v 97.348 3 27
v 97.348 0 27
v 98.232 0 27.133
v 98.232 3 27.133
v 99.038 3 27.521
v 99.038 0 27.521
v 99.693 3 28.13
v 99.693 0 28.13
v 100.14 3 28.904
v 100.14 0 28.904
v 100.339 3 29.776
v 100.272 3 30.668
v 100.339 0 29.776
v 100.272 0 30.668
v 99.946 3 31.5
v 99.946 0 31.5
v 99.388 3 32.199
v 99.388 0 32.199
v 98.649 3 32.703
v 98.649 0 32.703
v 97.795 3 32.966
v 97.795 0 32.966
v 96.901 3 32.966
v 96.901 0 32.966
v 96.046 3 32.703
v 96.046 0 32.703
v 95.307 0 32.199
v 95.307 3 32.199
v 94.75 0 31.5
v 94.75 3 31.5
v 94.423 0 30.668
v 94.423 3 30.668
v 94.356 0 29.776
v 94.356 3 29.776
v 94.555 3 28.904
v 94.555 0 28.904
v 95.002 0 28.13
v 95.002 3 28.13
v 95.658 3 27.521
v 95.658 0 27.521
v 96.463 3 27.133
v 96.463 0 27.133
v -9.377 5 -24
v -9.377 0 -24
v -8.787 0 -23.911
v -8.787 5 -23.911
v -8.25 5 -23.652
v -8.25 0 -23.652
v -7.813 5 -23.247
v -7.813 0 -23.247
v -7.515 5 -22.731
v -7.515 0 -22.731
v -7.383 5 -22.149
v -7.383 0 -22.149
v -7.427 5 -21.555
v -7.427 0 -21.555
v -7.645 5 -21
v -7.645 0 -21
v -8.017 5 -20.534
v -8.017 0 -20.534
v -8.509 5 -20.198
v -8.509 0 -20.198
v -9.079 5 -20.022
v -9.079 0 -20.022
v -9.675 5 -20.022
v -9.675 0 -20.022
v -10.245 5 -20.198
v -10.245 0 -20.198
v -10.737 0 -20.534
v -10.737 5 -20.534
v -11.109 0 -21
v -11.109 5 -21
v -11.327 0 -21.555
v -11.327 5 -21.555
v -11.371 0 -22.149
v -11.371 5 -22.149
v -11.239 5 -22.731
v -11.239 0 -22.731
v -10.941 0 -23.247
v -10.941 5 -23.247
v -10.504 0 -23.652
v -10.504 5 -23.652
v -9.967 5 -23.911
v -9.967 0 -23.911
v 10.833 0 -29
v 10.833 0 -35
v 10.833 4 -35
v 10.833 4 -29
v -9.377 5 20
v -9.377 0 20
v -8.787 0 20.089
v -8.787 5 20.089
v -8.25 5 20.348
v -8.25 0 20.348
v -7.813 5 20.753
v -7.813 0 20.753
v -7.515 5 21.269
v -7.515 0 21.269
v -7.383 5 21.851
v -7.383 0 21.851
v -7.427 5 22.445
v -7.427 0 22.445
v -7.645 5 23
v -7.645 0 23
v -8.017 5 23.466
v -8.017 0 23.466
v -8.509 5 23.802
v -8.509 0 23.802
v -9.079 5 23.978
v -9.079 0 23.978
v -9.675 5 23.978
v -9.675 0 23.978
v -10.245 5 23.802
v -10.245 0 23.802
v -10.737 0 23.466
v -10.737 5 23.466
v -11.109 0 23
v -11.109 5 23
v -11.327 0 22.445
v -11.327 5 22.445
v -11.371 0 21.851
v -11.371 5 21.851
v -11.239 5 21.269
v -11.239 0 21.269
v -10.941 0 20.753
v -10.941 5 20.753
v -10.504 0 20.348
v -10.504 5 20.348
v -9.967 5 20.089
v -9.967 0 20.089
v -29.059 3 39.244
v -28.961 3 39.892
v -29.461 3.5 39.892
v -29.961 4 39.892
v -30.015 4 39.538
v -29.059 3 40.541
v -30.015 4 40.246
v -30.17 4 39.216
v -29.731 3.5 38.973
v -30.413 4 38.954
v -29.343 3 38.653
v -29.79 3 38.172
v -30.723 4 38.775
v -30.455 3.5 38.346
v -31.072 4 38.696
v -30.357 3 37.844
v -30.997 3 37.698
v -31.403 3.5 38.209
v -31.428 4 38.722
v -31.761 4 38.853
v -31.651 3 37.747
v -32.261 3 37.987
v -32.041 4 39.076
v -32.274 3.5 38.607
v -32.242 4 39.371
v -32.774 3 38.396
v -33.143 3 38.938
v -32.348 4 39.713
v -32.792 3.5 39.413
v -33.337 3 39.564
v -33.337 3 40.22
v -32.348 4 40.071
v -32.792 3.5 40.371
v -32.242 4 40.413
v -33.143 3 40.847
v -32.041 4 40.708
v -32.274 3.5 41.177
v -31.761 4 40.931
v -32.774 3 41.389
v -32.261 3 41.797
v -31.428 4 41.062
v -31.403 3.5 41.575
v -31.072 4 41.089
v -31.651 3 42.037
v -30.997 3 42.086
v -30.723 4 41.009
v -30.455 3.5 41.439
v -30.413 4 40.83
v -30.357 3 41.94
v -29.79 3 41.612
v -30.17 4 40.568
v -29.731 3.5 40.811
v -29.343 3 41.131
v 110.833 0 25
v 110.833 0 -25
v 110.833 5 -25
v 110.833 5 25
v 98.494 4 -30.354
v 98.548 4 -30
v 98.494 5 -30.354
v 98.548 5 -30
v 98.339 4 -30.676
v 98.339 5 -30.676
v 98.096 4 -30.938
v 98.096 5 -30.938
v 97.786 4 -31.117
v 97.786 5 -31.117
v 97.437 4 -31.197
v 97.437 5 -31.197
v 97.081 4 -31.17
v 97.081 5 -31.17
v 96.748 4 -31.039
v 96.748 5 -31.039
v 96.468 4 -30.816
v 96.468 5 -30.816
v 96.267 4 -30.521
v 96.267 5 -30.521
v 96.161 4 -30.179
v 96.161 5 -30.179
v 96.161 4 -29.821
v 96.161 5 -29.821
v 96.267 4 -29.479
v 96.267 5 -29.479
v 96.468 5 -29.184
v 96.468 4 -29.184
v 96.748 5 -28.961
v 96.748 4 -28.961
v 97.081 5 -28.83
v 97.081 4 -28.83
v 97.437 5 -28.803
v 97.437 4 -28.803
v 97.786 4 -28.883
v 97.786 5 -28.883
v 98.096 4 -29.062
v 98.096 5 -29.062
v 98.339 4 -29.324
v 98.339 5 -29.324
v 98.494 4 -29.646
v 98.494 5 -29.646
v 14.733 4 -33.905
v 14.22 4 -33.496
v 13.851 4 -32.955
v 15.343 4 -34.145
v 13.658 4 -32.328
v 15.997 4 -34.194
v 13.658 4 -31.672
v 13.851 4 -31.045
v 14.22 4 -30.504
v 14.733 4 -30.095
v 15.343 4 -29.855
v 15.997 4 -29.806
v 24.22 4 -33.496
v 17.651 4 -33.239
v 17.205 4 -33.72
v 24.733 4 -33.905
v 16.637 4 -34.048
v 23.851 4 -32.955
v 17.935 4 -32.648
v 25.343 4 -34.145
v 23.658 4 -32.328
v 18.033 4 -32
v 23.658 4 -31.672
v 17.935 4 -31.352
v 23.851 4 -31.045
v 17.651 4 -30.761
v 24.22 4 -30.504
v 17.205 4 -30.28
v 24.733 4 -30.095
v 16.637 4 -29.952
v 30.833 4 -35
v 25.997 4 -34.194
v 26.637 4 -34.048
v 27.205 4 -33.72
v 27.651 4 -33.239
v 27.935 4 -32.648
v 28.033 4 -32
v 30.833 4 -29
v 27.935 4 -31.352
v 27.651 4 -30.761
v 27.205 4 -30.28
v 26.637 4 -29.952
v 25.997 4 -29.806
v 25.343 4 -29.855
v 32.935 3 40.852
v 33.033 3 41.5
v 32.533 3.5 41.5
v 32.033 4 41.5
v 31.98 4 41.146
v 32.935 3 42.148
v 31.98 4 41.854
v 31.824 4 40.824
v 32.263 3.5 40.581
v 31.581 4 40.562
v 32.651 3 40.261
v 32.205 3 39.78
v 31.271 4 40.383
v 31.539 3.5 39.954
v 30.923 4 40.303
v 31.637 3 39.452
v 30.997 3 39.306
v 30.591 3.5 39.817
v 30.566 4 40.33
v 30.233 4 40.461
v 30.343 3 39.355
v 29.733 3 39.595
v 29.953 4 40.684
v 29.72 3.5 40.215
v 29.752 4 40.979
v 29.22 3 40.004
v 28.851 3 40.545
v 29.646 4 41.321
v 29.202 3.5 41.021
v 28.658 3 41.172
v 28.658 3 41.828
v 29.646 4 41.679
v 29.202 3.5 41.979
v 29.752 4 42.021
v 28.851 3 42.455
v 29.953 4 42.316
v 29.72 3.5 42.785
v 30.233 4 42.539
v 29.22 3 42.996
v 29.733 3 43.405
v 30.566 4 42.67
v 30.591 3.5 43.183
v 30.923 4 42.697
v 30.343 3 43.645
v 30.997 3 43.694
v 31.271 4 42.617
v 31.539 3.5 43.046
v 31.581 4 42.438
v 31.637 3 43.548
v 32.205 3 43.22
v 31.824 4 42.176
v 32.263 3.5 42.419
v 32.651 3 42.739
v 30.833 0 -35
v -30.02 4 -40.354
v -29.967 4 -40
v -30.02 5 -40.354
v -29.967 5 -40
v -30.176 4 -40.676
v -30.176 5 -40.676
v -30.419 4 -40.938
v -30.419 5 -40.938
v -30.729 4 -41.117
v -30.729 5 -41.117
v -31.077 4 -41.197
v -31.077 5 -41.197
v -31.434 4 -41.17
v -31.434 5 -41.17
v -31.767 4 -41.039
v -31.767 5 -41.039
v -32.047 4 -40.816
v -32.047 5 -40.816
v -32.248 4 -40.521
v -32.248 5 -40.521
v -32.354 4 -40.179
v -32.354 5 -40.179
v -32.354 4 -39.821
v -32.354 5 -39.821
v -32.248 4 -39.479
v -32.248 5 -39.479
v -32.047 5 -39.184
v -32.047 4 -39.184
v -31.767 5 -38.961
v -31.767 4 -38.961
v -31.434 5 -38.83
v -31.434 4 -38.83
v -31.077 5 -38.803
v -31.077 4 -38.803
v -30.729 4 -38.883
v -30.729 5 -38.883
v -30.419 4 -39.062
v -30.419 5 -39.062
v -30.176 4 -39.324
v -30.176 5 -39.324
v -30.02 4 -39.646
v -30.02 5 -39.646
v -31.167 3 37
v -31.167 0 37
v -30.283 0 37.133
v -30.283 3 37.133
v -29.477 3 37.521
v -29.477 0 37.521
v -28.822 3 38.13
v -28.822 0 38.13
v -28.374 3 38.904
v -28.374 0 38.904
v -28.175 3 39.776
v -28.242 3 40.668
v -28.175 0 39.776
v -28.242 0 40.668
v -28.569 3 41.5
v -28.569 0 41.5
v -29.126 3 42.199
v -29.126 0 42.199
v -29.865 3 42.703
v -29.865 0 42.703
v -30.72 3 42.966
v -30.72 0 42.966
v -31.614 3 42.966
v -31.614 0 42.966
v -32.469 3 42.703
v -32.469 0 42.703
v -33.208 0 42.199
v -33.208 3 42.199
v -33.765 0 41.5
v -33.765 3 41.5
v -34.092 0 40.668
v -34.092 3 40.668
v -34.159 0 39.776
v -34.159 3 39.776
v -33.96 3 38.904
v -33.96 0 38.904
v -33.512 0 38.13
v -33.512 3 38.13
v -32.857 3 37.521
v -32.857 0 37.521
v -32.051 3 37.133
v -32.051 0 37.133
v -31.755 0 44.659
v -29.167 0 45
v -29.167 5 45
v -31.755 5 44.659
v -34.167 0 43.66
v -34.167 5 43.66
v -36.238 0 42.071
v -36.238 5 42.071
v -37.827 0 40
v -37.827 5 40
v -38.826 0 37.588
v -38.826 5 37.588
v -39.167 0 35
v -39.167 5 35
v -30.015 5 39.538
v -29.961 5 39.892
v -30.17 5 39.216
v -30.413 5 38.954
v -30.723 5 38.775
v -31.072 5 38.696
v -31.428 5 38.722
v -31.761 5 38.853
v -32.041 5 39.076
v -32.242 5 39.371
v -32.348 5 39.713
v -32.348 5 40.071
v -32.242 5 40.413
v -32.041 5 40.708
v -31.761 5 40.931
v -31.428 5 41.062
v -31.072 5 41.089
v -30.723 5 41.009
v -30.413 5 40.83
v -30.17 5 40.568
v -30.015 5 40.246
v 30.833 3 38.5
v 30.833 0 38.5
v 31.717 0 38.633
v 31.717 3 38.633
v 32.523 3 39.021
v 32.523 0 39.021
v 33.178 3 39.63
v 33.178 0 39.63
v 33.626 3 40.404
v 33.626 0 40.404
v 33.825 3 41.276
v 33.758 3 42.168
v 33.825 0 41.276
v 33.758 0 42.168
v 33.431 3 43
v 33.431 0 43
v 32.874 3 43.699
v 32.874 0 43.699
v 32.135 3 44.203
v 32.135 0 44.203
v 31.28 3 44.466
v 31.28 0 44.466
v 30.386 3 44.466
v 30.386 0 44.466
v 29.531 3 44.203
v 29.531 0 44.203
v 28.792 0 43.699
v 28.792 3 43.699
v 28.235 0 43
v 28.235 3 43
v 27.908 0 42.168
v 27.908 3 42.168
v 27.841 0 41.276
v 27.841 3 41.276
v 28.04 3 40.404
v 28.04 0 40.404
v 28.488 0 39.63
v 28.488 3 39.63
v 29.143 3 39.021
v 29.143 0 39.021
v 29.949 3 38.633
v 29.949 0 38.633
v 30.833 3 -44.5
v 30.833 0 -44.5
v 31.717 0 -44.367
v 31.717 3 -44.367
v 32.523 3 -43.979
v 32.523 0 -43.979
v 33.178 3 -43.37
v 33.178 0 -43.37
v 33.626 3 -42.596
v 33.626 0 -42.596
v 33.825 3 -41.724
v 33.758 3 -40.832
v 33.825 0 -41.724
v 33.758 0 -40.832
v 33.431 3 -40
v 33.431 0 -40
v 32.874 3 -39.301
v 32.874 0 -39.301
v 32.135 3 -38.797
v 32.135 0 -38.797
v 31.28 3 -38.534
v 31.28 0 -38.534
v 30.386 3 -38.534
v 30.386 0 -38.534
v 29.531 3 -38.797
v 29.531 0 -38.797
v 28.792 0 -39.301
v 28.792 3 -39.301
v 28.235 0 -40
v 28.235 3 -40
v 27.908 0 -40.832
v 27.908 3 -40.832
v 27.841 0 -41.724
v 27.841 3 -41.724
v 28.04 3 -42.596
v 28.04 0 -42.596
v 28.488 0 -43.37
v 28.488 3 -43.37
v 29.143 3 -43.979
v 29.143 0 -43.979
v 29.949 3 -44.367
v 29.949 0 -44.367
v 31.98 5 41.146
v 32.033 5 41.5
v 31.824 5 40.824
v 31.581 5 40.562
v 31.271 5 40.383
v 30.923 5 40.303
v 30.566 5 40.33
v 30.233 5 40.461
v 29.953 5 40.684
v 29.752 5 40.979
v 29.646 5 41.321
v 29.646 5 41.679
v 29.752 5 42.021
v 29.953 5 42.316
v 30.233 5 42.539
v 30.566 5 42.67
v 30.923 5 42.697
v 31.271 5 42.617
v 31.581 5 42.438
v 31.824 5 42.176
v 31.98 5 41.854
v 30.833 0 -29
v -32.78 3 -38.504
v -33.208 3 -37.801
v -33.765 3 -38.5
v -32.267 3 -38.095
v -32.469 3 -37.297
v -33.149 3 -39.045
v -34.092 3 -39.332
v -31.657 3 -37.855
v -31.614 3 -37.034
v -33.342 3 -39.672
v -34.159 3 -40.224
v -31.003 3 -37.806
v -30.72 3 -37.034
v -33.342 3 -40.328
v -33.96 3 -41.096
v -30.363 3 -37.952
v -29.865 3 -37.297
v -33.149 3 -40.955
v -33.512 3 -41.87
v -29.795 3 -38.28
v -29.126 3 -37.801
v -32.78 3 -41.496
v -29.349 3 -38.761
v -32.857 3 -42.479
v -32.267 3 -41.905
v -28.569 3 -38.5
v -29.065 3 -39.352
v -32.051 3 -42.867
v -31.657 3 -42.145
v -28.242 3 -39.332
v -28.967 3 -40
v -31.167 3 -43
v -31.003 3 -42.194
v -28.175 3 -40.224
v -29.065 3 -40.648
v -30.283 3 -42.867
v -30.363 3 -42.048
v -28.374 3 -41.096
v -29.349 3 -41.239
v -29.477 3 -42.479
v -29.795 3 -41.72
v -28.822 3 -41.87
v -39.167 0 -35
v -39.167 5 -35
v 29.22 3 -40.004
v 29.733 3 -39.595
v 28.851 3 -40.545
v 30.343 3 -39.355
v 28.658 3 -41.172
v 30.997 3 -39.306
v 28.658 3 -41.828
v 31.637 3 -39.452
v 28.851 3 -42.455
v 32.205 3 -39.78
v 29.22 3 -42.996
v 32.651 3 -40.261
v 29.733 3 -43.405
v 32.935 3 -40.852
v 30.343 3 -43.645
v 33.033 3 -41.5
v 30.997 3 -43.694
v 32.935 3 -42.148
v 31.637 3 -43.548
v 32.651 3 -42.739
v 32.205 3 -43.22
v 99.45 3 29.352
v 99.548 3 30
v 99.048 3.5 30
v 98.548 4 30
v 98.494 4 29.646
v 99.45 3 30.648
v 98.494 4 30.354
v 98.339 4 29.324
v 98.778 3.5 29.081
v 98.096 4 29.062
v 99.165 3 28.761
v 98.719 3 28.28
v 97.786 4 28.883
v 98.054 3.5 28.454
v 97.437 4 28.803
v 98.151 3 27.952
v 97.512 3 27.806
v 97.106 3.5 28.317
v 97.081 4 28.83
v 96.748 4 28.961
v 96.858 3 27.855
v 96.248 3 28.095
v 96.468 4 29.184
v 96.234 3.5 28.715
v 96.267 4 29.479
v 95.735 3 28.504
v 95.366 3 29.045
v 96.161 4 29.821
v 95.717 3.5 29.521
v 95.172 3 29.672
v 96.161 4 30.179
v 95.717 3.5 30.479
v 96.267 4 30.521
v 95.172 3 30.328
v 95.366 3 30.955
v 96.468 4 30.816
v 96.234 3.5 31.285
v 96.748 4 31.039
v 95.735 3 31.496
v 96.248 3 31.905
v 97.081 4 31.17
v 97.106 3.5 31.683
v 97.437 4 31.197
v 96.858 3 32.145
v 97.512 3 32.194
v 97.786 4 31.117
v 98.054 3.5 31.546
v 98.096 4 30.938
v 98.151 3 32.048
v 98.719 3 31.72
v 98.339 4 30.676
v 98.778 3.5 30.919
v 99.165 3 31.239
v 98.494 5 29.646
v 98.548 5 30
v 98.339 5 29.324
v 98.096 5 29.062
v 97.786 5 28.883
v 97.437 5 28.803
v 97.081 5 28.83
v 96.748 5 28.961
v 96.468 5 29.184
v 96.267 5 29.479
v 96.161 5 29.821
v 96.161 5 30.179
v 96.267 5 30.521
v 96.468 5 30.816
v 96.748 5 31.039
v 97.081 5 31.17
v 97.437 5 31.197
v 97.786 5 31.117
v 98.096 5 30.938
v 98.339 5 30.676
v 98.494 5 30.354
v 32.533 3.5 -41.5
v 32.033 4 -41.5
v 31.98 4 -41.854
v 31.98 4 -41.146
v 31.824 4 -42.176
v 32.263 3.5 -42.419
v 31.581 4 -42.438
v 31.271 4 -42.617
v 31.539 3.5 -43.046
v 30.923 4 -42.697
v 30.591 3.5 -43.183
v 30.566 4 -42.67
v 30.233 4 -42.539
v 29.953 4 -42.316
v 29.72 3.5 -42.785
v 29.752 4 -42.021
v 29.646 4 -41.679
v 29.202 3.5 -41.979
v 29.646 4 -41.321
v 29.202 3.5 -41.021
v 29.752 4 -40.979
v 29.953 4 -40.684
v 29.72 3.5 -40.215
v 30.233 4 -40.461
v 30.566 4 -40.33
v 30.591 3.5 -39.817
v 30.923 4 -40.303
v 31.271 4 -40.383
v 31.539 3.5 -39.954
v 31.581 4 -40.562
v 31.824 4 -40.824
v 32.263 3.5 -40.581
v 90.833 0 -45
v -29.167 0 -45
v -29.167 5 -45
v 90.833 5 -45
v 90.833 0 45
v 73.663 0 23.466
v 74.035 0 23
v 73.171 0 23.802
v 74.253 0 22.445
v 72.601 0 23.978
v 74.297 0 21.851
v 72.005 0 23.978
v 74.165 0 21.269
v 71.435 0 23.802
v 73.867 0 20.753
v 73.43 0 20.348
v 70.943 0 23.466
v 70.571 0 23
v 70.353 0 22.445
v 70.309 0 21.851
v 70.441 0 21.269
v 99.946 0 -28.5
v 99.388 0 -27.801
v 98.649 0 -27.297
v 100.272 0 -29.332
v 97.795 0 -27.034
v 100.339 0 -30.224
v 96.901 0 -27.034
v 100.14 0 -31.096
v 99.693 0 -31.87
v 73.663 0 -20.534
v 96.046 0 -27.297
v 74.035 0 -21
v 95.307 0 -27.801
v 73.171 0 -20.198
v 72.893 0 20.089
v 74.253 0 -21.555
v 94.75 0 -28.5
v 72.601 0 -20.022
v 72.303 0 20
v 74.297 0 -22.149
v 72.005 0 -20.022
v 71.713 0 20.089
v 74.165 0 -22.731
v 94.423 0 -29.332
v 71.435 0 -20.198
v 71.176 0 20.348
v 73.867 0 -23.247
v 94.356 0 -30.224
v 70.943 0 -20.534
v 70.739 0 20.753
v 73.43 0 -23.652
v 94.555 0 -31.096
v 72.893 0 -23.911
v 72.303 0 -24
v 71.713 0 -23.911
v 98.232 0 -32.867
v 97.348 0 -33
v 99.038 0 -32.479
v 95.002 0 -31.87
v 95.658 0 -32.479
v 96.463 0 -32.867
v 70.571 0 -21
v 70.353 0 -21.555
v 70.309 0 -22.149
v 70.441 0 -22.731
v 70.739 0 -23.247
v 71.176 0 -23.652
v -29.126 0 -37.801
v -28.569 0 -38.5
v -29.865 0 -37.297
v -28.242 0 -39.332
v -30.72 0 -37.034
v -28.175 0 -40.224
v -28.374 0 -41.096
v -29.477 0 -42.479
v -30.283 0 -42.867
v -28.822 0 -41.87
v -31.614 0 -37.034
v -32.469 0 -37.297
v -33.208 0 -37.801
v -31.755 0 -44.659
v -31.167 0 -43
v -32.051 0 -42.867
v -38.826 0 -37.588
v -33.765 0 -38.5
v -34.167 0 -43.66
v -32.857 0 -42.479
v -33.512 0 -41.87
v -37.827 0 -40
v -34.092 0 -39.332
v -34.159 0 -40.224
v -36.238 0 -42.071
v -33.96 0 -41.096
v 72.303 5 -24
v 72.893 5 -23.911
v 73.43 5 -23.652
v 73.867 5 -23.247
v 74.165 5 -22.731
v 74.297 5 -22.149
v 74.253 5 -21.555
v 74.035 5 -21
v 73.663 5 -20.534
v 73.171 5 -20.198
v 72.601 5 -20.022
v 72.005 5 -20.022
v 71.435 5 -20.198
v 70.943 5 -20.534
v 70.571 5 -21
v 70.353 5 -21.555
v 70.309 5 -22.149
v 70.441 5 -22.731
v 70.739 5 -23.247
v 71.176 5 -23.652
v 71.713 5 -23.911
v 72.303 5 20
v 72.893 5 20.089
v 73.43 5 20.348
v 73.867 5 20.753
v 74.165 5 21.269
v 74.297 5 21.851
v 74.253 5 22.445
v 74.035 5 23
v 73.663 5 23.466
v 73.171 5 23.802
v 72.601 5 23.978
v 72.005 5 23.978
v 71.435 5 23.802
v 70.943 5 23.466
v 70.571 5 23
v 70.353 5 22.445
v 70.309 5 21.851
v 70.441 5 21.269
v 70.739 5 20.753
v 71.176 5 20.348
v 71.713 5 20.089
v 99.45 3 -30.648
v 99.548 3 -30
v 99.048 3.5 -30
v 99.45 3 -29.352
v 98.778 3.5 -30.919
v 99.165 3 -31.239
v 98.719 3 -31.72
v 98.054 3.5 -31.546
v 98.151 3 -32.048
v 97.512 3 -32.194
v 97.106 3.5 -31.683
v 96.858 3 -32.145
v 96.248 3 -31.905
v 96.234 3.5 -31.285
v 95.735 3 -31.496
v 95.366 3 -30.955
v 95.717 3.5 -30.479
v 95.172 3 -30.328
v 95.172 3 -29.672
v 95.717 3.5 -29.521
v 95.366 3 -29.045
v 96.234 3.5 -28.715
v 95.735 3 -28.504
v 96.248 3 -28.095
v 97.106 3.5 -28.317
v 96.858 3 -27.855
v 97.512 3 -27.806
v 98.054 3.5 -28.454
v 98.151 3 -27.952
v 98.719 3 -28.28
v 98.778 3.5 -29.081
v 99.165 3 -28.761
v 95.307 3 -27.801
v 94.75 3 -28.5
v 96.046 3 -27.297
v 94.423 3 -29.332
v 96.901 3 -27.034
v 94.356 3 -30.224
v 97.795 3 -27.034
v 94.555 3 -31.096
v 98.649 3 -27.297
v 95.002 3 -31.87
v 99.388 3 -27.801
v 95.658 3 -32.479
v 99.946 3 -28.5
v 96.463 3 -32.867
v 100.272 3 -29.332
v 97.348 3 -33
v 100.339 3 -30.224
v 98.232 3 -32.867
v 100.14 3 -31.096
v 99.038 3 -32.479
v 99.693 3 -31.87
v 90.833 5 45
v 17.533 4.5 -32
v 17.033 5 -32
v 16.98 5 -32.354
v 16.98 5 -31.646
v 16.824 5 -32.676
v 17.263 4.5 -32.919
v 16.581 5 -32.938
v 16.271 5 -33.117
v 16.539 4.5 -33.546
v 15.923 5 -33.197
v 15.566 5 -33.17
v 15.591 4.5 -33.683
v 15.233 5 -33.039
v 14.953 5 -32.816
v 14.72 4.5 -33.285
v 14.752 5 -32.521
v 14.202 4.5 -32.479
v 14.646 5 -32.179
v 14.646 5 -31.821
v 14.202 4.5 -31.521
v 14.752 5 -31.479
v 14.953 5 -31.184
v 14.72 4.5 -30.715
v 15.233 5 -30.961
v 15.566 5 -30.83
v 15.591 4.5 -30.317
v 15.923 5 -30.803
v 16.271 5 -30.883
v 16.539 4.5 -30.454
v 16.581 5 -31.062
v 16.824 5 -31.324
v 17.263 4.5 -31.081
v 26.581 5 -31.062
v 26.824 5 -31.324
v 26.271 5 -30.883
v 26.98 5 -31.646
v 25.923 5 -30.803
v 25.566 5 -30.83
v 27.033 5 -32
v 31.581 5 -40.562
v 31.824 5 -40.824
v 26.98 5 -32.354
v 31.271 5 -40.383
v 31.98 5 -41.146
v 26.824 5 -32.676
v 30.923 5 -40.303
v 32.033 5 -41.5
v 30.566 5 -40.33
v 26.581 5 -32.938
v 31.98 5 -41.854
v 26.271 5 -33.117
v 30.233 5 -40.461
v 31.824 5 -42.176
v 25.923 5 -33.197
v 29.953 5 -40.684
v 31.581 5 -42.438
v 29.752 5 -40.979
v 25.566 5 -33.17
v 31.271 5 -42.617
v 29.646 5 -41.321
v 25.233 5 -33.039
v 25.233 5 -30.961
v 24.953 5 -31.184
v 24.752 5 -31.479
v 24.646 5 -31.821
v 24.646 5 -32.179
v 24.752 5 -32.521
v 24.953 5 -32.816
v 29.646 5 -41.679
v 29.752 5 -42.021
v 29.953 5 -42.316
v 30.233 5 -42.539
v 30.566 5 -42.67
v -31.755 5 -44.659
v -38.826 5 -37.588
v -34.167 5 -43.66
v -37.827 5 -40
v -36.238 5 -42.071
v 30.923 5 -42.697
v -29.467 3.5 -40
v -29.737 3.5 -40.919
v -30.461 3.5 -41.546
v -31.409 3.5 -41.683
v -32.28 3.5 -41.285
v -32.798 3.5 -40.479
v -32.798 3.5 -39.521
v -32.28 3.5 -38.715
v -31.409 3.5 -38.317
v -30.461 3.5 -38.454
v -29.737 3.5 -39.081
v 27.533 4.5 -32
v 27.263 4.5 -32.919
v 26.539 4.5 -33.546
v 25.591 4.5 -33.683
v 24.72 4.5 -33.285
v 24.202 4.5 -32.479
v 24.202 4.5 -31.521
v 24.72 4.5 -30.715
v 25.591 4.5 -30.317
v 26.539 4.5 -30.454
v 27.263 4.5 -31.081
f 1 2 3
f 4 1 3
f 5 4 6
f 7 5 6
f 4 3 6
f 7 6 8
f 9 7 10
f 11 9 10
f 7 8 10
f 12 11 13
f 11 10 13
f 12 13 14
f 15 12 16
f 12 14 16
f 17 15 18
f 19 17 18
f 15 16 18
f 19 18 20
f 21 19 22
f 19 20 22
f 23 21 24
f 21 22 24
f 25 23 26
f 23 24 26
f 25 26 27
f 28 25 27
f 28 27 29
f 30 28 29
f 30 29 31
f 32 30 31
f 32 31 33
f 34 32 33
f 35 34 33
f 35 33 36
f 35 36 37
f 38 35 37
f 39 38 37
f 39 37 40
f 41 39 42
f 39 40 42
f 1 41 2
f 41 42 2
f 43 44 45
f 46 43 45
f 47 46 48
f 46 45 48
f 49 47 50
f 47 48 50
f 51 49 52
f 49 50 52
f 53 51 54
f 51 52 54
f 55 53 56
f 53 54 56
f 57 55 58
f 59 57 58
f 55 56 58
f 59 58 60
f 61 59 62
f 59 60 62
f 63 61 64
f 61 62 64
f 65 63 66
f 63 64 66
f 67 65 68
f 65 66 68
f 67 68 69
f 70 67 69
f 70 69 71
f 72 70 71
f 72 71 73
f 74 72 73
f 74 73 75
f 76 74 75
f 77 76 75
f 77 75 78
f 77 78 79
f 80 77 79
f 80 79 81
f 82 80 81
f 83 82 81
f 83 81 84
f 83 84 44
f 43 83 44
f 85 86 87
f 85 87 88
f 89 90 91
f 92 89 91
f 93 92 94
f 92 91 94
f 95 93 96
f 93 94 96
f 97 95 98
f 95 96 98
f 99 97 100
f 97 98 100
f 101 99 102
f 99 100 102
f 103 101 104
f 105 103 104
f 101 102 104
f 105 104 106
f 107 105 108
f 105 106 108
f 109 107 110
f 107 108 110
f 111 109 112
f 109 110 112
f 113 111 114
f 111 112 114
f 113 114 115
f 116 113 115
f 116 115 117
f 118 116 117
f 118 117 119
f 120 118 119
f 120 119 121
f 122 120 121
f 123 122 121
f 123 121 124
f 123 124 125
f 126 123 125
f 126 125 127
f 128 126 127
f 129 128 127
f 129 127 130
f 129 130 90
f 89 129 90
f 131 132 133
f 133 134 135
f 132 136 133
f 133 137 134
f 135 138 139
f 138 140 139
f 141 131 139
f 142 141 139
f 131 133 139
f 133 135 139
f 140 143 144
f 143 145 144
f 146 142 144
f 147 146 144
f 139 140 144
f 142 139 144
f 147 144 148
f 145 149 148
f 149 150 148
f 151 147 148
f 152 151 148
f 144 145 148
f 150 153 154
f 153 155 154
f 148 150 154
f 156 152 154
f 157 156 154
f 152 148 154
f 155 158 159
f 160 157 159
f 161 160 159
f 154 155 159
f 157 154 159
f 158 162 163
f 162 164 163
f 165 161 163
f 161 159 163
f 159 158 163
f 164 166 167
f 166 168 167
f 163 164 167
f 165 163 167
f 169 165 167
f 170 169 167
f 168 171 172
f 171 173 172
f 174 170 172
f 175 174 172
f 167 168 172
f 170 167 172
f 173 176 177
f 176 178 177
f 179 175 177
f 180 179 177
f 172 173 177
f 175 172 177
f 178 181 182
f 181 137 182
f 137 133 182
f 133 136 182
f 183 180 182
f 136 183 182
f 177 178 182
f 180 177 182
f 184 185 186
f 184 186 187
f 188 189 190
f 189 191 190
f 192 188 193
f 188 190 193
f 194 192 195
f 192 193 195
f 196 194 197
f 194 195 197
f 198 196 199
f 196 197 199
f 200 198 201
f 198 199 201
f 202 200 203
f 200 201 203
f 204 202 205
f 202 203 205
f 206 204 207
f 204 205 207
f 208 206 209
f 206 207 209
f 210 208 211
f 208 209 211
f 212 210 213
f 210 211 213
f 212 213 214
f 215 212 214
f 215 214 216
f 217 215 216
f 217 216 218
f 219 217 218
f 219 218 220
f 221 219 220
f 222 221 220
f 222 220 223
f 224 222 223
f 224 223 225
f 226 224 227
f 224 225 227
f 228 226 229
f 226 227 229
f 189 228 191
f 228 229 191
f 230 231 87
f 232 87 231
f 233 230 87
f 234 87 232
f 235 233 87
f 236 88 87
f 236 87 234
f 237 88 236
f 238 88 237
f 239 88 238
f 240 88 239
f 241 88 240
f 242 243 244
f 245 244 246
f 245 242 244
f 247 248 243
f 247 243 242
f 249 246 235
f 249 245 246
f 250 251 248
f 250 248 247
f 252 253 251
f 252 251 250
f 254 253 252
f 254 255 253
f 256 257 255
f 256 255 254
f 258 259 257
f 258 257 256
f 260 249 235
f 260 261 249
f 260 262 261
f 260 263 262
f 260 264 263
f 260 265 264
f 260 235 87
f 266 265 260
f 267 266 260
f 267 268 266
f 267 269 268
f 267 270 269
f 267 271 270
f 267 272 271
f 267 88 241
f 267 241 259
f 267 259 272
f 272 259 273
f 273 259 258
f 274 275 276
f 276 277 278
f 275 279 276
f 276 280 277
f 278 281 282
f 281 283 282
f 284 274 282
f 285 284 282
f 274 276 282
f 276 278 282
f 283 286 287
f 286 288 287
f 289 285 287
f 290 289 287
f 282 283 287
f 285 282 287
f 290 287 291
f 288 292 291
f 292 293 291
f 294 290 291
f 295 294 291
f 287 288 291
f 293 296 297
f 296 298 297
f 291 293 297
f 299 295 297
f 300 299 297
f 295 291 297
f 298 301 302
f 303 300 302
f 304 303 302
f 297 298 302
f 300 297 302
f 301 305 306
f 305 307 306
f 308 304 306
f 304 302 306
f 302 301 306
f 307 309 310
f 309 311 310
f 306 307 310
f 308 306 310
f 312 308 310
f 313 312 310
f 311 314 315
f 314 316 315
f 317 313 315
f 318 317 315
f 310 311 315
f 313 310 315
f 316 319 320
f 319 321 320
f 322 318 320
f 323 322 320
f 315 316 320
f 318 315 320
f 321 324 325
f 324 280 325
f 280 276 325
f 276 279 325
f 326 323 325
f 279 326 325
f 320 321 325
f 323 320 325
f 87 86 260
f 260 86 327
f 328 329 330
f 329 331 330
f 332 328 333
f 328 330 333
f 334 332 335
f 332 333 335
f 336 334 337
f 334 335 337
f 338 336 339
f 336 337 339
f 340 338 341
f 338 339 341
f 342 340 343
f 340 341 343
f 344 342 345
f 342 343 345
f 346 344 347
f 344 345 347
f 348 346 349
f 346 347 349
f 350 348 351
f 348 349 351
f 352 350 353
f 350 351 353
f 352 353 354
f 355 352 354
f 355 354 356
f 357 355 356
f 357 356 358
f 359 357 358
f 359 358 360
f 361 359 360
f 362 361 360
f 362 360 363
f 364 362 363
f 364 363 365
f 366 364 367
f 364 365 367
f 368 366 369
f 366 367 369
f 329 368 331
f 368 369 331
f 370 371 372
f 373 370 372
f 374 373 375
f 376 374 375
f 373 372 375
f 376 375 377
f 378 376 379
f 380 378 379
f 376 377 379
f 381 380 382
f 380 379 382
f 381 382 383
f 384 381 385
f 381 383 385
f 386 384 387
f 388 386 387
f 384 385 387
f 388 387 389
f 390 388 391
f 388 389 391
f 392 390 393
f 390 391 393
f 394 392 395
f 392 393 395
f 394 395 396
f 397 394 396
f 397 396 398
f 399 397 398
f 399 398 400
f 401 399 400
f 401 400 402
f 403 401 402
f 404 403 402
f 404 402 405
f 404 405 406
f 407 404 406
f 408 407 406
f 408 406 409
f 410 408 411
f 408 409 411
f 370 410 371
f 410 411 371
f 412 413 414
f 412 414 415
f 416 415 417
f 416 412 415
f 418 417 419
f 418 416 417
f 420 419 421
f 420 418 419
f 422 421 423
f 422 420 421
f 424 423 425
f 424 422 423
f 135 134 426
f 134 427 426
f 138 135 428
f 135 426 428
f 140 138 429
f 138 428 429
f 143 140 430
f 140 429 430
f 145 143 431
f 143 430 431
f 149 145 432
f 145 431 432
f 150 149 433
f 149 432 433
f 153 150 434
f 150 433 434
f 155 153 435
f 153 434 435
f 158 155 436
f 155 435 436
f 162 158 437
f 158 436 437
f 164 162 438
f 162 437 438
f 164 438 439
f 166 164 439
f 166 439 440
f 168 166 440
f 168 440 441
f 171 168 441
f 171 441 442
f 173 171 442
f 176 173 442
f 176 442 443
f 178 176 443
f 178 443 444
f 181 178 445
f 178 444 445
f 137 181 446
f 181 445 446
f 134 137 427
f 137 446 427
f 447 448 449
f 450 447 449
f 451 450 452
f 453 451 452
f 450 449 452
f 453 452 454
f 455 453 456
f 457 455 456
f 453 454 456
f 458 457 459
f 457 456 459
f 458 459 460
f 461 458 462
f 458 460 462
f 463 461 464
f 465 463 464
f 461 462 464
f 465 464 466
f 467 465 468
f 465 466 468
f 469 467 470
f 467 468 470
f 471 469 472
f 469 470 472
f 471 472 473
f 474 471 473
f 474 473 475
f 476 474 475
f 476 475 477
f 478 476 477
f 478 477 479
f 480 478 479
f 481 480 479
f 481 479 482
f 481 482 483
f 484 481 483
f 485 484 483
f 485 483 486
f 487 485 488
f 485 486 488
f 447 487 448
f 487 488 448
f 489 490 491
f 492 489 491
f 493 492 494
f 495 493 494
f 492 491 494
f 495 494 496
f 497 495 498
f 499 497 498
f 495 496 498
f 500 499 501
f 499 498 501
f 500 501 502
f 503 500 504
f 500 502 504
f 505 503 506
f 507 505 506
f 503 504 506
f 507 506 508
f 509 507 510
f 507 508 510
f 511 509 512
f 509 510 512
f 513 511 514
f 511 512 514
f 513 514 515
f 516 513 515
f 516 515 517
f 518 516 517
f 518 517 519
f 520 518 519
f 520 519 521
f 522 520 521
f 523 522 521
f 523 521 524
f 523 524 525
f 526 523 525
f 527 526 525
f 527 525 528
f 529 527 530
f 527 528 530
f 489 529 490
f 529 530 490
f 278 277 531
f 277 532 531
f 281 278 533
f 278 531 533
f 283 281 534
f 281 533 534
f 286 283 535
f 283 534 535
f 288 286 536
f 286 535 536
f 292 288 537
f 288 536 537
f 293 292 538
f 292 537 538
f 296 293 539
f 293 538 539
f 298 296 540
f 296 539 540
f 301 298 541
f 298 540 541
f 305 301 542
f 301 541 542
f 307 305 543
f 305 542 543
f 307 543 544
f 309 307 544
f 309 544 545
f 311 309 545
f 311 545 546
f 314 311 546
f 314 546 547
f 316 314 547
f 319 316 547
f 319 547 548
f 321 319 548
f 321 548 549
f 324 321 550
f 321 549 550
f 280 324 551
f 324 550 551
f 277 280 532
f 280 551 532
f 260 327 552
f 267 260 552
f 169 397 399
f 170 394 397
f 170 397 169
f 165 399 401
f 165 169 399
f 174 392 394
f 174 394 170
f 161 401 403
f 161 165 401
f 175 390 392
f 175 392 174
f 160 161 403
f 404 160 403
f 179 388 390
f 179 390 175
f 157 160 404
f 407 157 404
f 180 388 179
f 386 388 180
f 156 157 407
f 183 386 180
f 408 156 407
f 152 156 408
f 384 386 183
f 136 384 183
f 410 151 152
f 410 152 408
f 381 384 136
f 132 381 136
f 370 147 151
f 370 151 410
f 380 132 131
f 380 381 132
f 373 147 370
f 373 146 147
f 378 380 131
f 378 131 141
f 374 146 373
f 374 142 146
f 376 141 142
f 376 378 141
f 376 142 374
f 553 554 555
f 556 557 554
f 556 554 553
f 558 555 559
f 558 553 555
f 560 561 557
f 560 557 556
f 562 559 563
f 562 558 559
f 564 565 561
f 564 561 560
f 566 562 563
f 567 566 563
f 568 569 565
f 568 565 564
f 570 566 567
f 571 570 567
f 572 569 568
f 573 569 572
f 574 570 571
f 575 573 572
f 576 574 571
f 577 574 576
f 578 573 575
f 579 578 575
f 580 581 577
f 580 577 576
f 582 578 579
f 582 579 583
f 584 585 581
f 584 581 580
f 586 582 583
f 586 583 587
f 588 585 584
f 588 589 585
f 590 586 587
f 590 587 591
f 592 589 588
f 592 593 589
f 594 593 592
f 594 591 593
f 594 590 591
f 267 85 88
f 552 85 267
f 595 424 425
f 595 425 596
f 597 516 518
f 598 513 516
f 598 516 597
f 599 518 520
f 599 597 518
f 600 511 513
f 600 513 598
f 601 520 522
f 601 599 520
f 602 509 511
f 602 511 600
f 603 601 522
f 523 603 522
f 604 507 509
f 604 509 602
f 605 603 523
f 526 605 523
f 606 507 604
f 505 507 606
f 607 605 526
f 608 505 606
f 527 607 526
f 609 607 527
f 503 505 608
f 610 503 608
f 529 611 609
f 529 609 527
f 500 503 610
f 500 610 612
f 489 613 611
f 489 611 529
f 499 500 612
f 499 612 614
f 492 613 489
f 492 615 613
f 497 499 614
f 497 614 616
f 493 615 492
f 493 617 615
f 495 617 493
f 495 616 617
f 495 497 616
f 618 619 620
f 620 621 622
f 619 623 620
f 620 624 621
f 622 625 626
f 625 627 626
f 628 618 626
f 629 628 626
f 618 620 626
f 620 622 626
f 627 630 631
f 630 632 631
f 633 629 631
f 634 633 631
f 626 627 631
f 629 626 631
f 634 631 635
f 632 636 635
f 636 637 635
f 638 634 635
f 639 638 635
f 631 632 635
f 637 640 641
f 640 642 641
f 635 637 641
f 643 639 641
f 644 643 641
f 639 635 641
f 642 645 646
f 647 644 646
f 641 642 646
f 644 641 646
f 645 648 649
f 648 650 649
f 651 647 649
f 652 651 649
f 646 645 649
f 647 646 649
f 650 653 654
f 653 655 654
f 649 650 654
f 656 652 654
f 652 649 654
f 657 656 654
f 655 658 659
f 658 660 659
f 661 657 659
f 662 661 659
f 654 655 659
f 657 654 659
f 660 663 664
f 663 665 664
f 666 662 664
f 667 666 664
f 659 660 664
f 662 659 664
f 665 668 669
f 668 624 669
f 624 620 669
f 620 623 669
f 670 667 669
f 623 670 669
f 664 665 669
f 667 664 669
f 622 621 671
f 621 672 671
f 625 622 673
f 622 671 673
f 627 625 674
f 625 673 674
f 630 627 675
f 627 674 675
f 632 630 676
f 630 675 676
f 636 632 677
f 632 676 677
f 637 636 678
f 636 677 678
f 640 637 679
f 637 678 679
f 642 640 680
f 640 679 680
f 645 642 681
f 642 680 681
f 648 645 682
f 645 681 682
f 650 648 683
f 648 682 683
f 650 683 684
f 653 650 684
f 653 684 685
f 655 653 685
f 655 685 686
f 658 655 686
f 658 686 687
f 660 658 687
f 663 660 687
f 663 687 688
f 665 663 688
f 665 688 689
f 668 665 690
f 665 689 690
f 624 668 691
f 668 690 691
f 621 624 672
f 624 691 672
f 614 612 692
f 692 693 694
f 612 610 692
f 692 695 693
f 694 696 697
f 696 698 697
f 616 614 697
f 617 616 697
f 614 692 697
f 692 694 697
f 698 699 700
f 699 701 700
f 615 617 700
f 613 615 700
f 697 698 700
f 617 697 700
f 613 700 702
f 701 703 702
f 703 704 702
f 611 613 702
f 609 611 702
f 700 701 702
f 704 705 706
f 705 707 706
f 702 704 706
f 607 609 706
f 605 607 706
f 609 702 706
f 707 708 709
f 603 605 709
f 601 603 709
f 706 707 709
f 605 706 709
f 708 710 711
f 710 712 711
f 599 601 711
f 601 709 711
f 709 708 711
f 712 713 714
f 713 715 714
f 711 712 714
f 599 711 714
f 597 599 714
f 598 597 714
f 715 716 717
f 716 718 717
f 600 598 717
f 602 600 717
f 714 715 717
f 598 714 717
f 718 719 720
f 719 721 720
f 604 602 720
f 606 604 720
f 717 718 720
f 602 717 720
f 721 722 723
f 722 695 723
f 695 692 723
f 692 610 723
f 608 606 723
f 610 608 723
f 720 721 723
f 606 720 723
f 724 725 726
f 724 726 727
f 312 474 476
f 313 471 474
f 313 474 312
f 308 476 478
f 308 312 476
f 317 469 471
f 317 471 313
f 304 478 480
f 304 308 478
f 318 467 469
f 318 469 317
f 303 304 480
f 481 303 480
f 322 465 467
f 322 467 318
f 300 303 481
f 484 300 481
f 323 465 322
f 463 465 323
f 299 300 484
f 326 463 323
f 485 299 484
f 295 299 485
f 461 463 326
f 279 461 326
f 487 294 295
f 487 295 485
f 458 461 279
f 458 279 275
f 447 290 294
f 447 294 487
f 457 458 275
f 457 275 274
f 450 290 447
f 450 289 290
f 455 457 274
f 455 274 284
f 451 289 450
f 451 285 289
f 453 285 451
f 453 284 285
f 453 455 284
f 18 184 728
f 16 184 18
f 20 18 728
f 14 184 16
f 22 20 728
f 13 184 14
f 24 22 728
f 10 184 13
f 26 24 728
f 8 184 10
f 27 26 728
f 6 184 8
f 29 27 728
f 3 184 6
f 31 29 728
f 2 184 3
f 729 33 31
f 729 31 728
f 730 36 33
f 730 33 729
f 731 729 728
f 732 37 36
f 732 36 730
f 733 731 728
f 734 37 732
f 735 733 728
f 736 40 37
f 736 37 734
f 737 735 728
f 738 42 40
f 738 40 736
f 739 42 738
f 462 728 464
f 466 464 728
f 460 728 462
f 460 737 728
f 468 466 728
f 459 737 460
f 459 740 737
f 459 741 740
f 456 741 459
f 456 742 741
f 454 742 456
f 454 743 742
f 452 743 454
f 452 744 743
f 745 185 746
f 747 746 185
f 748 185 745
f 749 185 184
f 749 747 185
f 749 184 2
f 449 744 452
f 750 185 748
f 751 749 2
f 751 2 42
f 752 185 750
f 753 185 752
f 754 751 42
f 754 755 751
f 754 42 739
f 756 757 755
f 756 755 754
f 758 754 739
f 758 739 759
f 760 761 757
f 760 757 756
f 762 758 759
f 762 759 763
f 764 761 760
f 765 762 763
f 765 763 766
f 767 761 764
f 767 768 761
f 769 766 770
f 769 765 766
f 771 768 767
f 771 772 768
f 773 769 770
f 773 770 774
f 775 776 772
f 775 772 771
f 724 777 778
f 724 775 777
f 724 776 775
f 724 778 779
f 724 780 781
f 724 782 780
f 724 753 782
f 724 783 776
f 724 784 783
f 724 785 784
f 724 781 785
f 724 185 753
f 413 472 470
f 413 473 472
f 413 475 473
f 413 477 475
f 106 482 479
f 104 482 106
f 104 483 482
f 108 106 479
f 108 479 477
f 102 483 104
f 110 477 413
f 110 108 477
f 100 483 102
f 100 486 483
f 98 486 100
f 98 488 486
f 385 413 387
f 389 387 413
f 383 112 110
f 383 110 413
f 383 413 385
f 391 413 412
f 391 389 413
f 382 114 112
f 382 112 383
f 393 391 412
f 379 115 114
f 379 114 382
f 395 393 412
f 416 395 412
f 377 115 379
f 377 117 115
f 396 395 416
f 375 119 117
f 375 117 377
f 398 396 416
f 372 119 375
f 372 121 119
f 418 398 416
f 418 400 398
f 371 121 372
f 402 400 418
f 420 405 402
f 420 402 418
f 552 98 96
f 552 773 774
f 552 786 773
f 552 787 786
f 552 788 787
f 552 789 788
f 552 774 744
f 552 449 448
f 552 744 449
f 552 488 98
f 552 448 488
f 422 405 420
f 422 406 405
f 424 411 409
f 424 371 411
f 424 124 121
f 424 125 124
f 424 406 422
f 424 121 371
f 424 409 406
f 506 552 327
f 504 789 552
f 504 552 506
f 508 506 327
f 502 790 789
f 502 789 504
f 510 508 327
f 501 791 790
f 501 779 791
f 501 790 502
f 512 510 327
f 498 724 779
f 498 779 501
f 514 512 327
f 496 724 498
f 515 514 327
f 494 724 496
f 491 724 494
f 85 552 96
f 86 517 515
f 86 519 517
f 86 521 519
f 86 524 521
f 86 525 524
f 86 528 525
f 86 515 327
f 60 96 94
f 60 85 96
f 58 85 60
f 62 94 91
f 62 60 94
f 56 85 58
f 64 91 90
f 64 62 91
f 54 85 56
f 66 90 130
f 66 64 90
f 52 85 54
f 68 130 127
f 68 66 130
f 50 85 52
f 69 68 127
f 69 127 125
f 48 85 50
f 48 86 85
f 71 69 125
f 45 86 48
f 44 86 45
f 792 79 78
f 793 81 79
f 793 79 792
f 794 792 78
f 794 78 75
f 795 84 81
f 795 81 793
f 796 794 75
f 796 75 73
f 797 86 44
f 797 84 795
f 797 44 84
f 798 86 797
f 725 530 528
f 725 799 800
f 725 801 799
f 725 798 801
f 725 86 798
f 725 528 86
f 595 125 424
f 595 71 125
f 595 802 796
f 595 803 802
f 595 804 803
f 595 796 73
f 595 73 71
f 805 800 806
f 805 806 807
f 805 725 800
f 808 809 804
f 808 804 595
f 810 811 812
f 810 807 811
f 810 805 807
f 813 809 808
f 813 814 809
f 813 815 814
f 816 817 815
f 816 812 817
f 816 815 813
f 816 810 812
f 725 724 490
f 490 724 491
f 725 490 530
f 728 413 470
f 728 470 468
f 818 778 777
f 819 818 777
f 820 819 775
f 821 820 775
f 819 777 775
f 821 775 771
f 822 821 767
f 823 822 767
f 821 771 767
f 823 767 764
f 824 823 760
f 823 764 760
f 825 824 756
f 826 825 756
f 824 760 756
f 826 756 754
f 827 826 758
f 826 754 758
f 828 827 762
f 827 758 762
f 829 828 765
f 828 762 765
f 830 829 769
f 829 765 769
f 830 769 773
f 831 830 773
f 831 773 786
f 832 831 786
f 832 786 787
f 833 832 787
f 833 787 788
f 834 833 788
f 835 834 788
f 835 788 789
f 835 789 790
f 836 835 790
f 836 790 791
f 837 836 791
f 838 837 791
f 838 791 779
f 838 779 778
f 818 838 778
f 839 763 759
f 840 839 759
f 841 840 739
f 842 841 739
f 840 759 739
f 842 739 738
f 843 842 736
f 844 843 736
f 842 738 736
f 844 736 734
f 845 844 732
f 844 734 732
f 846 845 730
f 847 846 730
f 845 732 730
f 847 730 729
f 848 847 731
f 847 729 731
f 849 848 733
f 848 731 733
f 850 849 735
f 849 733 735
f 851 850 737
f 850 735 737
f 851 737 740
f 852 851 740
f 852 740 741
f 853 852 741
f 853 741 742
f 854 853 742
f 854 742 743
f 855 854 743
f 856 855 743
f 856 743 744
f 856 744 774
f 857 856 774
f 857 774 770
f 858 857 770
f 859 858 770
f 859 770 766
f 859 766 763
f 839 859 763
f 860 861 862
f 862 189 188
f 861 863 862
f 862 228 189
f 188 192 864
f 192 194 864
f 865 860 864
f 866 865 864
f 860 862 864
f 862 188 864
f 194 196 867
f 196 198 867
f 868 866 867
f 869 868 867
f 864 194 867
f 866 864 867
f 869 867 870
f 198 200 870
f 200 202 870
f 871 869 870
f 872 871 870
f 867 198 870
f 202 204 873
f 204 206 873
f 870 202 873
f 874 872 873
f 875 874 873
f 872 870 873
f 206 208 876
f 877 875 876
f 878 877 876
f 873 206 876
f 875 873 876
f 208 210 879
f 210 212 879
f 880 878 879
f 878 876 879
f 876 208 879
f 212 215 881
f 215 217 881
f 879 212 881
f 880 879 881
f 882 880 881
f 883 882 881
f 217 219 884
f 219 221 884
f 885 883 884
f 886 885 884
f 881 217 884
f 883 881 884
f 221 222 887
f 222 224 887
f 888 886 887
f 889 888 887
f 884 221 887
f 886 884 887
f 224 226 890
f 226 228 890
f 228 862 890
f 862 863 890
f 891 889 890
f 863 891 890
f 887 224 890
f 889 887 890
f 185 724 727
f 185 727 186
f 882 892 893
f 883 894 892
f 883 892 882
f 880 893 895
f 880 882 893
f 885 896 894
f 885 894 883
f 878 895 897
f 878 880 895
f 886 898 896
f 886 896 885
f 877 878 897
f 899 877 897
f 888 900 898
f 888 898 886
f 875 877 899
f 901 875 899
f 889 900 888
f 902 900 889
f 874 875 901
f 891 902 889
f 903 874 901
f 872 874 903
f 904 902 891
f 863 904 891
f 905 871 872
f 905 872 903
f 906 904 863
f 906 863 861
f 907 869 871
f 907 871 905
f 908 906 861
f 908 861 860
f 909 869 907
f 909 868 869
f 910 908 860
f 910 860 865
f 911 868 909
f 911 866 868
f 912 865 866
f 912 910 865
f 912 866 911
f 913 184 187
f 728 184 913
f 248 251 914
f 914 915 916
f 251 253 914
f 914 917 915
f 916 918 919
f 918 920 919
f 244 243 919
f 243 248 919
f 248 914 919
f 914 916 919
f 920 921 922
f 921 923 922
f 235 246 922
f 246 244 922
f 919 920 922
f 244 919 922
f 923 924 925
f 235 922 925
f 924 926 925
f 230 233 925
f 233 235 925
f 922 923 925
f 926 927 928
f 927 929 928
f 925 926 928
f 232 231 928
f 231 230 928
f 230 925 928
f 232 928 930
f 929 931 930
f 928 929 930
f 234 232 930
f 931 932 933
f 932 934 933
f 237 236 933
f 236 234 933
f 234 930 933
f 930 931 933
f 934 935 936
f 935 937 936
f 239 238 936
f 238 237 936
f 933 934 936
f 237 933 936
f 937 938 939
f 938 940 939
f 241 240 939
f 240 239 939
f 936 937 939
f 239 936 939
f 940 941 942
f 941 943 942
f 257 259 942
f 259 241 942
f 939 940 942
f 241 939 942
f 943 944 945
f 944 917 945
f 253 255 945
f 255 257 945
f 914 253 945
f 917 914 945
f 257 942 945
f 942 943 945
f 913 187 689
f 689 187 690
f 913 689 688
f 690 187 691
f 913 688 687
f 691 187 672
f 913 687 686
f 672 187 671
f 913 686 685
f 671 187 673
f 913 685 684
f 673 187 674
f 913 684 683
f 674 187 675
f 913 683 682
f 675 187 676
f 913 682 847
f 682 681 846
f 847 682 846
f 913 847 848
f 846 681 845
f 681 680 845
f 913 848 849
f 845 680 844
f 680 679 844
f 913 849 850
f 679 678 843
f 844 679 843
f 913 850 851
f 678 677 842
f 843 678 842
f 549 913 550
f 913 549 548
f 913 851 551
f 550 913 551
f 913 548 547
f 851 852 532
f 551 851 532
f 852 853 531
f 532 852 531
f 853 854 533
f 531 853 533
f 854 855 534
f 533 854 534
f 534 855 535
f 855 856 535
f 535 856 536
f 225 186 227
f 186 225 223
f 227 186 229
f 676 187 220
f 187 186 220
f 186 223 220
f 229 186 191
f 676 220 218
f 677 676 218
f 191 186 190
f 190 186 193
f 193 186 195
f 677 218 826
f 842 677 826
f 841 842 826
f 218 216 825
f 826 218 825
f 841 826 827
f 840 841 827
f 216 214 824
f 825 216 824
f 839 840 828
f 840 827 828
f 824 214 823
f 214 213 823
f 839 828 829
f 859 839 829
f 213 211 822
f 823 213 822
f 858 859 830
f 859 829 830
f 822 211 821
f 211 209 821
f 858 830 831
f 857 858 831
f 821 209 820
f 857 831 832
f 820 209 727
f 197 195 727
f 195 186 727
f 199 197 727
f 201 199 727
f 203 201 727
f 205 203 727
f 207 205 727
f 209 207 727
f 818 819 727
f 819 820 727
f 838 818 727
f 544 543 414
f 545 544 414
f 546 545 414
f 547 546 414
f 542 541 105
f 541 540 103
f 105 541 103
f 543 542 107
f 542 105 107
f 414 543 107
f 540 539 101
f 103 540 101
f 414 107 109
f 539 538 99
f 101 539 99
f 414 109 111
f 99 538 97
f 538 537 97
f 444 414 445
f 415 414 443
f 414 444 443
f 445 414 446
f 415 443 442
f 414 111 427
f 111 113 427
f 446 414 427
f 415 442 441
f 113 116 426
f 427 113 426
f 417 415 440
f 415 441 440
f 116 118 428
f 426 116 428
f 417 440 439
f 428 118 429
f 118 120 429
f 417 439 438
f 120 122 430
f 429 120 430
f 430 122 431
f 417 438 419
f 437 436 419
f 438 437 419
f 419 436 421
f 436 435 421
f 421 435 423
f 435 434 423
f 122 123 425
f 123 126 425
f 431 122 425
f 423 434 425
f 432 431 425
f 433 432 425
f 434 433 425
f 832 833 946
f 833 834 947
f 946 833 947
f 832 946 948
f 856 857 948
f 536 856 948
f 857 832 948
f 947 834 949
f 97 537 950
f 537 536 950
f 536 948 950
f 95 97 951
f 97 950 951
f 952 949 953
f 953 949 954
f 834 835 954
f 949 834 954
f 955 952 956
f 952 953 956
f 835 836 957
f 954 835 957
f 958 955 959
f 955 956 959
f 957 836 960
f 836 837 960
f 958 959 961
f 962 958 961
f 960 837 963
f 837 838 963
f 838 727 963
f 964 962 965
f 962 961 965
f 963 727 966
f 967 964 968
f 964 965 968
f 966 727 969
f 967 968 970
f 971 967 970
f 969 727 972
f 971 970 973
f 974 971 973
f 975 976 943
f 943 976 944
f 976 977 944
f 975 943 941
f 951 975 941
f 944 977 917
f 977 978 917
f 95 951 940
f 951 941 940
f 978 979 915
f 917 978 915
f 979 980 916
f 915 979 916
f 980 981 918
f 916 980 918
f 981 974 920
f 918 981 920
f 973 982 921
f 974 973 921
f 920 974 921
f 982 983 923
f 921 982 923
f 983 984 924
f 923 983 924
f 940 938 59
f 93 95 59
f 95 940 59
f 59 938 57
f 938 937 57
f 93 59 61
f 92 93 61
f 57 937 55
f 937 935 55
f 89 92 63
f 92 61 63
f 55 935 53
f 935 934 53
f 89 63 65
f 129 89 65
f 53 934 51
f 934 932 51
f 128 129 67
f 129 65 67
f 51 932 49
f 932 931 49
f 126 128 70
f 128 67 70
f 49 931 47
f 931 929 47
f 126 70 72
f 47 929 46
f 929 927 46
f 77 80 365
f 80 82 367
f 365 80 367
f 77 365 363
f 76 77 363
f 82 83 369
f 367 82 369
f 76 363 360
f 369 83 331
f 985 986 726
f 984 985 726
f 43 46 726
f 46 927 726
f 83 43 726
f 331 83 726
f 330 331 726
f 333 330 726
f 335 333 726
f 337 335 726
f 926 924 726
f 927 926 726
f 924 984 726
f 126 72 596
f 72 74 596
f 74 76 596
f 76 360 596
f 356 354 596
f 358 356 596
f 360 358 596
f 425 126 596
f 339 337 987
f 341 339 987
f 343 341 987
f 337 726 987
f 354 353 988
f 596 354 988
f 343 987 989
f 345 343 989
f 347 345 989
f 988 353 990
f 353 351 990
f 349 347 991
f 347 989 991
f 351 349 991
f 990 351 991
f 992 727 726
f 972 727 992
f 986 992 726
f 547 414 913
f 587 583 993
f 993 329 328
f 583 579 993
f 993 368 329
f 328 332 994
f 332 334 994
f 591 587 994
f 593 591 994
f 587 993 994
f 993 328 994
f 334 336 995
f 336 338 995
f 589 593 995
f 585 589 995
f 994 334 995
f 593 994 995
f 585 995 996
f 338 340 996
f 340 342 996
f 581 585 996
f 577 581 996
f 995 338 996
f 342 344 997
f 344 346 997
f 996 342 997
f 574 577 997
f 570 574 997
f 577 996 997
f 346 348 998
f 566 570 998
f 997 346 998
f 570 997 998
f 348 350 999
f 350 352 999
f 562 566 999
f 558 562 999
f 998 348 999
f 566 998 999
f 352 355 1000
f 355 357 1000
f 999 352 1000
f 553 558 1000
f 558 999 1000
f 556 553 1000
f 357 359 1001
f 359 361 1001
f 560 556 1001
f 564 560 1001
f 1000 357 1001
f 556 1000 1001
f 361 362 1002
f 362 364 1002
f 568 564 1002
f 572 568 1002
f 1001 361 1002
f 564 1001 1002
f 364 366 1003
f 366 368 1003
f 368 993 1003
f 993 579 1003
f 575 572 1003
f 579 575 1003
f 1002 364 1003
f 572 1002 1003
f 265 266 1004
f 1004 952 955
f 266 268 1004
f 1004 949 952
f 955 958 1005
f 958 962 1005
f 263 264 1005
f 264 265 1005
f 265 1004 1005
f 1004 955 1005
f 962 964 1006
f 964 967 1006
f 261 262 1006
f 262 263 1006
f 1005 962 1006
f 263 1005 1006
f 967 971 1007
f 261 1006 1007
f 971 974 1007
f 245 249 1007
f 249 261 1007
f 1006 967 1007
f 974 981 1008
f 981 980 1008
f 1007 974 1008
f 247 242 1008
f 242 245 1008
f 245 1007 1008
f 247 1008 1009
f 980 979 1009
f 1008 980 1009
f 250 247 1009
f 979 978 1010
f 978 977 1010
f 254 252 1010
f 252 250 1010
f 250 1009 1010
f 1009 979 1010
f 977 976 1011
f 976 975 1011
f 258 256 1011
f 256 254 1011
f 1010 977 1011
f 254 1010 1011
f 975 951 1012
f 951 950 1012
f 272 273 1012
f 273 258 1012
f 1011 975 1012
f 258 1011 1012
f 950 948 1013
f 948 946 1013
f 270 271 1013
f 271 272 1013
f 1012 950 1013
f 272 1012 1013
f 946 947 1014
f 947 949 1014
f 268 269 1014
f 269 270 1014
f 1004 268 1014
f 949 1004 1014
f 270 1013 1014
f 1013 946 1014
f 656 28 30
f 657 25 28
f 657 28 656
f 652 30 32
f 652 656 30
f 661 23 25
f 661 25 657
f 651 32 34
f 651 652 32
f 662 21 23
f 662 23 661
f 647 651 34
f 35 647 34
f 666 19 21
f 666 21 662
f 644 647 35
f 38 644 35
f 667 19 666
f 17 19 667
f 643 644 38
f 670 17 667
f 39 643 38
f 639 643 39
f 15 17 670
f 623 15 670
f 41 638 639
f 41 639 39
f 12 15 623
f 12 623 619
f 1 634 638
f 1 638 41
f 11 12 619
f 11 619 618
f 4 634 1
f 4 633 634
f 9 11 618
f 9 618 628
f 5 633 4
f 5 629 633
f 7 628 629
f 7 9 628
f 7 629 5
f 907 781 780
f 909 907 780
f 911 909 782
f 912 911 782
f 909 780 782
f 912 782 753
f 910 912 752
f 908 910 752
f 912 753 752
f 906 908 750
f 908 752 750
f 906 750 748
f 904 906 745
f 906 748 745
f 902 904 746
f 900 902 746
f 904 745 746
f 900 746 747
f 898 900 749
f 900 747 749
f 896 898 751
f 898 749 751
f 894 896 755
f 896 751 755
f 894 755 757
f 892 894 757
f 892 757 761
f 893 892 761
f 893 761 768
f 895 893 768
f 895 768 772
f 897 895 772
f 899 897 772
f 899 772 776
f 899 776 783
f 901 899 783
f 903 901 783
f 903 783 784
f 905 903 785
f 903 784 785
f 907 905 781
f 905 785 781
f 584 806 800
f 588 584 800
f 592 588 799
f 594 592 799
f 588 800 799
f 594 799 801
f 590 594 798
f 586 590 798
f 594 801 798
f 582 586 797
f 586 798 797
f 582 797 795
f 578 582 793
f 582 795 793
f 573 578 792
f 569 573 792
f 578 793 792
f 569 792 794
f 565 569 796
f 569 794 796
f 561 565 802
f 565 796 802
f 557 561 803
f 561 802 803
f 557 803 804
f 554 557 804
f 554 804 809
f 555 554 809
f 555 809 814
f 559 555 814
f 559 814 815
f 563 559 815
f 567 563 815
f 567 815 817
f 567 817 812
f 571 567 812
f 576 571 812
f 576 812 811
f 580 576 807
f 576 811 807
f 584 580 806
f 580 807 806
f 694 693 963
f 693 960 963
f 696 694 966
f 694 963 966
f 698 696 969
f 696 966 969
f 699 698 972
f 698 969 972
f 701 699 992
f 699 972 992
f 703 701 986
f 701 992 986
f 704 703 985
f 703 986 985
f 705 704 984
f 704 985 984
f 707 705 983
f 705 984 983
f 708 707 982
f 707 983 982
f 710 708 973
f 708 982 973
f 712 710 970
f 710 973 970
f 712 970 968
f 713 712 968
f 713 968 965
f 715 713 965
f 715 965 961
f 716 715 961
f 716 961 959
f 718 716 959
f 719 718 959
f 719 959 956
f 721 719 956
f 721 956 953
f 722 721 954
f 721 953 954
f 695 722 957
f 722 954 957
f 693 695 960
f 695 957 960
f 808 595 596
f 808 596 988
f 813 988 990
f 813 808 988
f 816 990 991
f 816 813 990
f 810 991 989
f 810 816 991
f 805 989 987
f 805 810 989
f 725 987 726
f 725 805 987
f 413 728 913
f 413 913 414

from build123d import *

# Parameters (mm, degrees)
ESTRUSIONE_ESTRUSIONE1_DEPTH           = 5
SCHIZZO2_W                             = 20
SCHIZZO2_H                             = 6
TAGLIO_ESTRUSIONE1_DEPTH               = 4
FORO_SVASATO_PER_VITE_M2_1_D           = 2.4
FORO_SVASATO_PER_VITE_M2_1_DEPTH       = 4
FORO_SVASATO_PER_VITE_M2_1_CSINK_D     = 4.4
FORO_SVASATO_PER_VITE_M2_1_CSINK_ANGLE = 90
SCHIZZO6_R                             = 2
TAGLIO_ESTRUSIONE3_DEPTH               = 38
SCHIZZO8_R                             = 3
TAGLIO_ESTRUSIONE4_DEPTH               = 3
FORO_SVASATO_PER_VITE_M2_2_D           = 2.4
FORO_SVASATO_PER_VITE_M2_2_DEPTH       = 4
FORO_SVASATO_PER_VITE_M2_2_CSINK_D     = 4.4
FORO_SVASATO_PER_VITE_M2_2_CSINK_ANGLE = 90


with BuildPart() as part:
    # Schizzo1 → Estrusione-Estrusione1 (new body)
    with BuildSketch(Plane(origin=(0, 0, 0), x_dir=(1, 0, 0), z_dir=(0, 1, 0))):
        with BuildLine():
            Line((-29.167003354, 45), (90.832996646, 45))
            Line((90.832996646, 45), (110.832996646, 25))
            Line((110.832996646, 25), (110.832996646, -25))
            Line((110.832996646, -25), (90.832996646, -45))
            Line((90.832996646, -45), (-29.167003354, -45))
            ThreePointArc((-29.167003354, -45), (-36.238071166, -42.071067812), (-39.167003354, -35))
            Line((-39.167003354, -35), (-39.167003354, 35))
            ThreePointArc((-39.167003354, 35), (-36.238071166, 42.071067812), (-29.167003354, 45))
        make_face()
    extrude(amount=ESTRUSIONE_ESTRUSIONE1_DEPTH)

    # Schizzo2 → Taglio-Estrusione1 (cut)
    with BuildSketch(Plane.XZ):
        with Locations((20.832996646, -32)):
            Rectangle(SCHIZZO2_W, SCHIZZO2_H)
    extrude(amount=-TAGLIO_ESTRUSIONE1_DEPTH, mode=Mode.SUBTRACT)

    # Foro svasato per Vite M2-1
    with Locations(Plane(origin=(0, 4, 0), x_dir=(-1, 0, 0), z_dir=(0, -1, 0))):
        with Locations((-15.832996646, 32), (-25.832996646, 32)):
            CounterSinkHole(FORO_SVASATO_PER_VITE_M2_1_D / 2, FORO_SVASATO_PER_VITE_M2_1_CSINK_D / 2, depth=FORO_SVASATO_PER_VITE_M2_1_DEPTH, counter_sink_angle=FORO_SVASATO_PER_VITE_M2_1_CSINK_ANGLE)

    # Schizzo6 → Taglio-Estrusione3 (cut)
    with BuildSketch(Plane.XZ):
        with Locations(Location((-9.377003354, 22, 0), (0, 0, 270))):
            Circle(SCHIZZO6_R)
        with Locations(Location((72.302996646, 22, 0), (0, 0, 270))):
            Circle(SCHIZZO6_R)
        with Locations(Location((72.302996646, -22, 0), (0, 0, 270))):
            Circle(SCHIZZO6_R)
        with Locations(Location((-9.377003354, -22, 0), (0, 0, 270))):
            Circle(SCHIZZO6_R)
    extrude(amount=-TAGLIO_ESTRUSIONE3_DEPTH, mode=Mode.SUBTRACT)

    # Schizzo8 → Taglio-Estrusione4 (cut)
    with BuildSketch(Plane.XZ):
        with Locations(Location((-31.167003354, 40, 0), (0, 0, 270))):
            Circle(SCHIZZO8_R)
        with Locations(Location((30.832996646, 41.5, 0), (0, 0, 270))):
            Circle(SCHIZZO8_R)
        with Locations(Location((97.347715272, 30, 0), (0, 0, 270))):
            Circle(SCHIZZO8_R)
        with Locations(Location((97.347715272, -30, 0), (0, 0, 270))):
            Circle(SCHIZZO8_R)
        with Locations(Location((30.832996646, -41.5, 0), (0, 0, 270))):
            Circle(SCHIZZO8_R)
        with Locations(Location((-31.167003354, -40, 0), (0, 0, 270))):
            Circle(SCHIZZO8_R)
    extrude(amount=-TAGLIO_ESTRUSIONE4_DEPTH, mode=Mode.SUBTRACT)

    # Foro svasato per Vite M2-2
    with Locations(Plane(origin=(0, 3, 0), x_dir=(-1, 0, 0), z_dir=(0, -1, 0))):
        with Locations((31.161216293, -39.892156873), (-30.832996646, -41.5), (-97.347715272, -30), (-97.347715272, 30), (-30.832996646, 41.5), (31.167003354, 40)):
            CounterSinkHole(FORO_SVASATO_PER_VITE_M2_2_D / 2, FORO_SVASATO_PER_VITE_M2_2_CSINK_D / 2, depth=FORO_SVASATO_PER_VITE_M2_2_DEPTH, counter_sink_angle=FORO_SVASATO_PER_VITE_M2_2_CSINK_ANGLE)


solid = part.part
